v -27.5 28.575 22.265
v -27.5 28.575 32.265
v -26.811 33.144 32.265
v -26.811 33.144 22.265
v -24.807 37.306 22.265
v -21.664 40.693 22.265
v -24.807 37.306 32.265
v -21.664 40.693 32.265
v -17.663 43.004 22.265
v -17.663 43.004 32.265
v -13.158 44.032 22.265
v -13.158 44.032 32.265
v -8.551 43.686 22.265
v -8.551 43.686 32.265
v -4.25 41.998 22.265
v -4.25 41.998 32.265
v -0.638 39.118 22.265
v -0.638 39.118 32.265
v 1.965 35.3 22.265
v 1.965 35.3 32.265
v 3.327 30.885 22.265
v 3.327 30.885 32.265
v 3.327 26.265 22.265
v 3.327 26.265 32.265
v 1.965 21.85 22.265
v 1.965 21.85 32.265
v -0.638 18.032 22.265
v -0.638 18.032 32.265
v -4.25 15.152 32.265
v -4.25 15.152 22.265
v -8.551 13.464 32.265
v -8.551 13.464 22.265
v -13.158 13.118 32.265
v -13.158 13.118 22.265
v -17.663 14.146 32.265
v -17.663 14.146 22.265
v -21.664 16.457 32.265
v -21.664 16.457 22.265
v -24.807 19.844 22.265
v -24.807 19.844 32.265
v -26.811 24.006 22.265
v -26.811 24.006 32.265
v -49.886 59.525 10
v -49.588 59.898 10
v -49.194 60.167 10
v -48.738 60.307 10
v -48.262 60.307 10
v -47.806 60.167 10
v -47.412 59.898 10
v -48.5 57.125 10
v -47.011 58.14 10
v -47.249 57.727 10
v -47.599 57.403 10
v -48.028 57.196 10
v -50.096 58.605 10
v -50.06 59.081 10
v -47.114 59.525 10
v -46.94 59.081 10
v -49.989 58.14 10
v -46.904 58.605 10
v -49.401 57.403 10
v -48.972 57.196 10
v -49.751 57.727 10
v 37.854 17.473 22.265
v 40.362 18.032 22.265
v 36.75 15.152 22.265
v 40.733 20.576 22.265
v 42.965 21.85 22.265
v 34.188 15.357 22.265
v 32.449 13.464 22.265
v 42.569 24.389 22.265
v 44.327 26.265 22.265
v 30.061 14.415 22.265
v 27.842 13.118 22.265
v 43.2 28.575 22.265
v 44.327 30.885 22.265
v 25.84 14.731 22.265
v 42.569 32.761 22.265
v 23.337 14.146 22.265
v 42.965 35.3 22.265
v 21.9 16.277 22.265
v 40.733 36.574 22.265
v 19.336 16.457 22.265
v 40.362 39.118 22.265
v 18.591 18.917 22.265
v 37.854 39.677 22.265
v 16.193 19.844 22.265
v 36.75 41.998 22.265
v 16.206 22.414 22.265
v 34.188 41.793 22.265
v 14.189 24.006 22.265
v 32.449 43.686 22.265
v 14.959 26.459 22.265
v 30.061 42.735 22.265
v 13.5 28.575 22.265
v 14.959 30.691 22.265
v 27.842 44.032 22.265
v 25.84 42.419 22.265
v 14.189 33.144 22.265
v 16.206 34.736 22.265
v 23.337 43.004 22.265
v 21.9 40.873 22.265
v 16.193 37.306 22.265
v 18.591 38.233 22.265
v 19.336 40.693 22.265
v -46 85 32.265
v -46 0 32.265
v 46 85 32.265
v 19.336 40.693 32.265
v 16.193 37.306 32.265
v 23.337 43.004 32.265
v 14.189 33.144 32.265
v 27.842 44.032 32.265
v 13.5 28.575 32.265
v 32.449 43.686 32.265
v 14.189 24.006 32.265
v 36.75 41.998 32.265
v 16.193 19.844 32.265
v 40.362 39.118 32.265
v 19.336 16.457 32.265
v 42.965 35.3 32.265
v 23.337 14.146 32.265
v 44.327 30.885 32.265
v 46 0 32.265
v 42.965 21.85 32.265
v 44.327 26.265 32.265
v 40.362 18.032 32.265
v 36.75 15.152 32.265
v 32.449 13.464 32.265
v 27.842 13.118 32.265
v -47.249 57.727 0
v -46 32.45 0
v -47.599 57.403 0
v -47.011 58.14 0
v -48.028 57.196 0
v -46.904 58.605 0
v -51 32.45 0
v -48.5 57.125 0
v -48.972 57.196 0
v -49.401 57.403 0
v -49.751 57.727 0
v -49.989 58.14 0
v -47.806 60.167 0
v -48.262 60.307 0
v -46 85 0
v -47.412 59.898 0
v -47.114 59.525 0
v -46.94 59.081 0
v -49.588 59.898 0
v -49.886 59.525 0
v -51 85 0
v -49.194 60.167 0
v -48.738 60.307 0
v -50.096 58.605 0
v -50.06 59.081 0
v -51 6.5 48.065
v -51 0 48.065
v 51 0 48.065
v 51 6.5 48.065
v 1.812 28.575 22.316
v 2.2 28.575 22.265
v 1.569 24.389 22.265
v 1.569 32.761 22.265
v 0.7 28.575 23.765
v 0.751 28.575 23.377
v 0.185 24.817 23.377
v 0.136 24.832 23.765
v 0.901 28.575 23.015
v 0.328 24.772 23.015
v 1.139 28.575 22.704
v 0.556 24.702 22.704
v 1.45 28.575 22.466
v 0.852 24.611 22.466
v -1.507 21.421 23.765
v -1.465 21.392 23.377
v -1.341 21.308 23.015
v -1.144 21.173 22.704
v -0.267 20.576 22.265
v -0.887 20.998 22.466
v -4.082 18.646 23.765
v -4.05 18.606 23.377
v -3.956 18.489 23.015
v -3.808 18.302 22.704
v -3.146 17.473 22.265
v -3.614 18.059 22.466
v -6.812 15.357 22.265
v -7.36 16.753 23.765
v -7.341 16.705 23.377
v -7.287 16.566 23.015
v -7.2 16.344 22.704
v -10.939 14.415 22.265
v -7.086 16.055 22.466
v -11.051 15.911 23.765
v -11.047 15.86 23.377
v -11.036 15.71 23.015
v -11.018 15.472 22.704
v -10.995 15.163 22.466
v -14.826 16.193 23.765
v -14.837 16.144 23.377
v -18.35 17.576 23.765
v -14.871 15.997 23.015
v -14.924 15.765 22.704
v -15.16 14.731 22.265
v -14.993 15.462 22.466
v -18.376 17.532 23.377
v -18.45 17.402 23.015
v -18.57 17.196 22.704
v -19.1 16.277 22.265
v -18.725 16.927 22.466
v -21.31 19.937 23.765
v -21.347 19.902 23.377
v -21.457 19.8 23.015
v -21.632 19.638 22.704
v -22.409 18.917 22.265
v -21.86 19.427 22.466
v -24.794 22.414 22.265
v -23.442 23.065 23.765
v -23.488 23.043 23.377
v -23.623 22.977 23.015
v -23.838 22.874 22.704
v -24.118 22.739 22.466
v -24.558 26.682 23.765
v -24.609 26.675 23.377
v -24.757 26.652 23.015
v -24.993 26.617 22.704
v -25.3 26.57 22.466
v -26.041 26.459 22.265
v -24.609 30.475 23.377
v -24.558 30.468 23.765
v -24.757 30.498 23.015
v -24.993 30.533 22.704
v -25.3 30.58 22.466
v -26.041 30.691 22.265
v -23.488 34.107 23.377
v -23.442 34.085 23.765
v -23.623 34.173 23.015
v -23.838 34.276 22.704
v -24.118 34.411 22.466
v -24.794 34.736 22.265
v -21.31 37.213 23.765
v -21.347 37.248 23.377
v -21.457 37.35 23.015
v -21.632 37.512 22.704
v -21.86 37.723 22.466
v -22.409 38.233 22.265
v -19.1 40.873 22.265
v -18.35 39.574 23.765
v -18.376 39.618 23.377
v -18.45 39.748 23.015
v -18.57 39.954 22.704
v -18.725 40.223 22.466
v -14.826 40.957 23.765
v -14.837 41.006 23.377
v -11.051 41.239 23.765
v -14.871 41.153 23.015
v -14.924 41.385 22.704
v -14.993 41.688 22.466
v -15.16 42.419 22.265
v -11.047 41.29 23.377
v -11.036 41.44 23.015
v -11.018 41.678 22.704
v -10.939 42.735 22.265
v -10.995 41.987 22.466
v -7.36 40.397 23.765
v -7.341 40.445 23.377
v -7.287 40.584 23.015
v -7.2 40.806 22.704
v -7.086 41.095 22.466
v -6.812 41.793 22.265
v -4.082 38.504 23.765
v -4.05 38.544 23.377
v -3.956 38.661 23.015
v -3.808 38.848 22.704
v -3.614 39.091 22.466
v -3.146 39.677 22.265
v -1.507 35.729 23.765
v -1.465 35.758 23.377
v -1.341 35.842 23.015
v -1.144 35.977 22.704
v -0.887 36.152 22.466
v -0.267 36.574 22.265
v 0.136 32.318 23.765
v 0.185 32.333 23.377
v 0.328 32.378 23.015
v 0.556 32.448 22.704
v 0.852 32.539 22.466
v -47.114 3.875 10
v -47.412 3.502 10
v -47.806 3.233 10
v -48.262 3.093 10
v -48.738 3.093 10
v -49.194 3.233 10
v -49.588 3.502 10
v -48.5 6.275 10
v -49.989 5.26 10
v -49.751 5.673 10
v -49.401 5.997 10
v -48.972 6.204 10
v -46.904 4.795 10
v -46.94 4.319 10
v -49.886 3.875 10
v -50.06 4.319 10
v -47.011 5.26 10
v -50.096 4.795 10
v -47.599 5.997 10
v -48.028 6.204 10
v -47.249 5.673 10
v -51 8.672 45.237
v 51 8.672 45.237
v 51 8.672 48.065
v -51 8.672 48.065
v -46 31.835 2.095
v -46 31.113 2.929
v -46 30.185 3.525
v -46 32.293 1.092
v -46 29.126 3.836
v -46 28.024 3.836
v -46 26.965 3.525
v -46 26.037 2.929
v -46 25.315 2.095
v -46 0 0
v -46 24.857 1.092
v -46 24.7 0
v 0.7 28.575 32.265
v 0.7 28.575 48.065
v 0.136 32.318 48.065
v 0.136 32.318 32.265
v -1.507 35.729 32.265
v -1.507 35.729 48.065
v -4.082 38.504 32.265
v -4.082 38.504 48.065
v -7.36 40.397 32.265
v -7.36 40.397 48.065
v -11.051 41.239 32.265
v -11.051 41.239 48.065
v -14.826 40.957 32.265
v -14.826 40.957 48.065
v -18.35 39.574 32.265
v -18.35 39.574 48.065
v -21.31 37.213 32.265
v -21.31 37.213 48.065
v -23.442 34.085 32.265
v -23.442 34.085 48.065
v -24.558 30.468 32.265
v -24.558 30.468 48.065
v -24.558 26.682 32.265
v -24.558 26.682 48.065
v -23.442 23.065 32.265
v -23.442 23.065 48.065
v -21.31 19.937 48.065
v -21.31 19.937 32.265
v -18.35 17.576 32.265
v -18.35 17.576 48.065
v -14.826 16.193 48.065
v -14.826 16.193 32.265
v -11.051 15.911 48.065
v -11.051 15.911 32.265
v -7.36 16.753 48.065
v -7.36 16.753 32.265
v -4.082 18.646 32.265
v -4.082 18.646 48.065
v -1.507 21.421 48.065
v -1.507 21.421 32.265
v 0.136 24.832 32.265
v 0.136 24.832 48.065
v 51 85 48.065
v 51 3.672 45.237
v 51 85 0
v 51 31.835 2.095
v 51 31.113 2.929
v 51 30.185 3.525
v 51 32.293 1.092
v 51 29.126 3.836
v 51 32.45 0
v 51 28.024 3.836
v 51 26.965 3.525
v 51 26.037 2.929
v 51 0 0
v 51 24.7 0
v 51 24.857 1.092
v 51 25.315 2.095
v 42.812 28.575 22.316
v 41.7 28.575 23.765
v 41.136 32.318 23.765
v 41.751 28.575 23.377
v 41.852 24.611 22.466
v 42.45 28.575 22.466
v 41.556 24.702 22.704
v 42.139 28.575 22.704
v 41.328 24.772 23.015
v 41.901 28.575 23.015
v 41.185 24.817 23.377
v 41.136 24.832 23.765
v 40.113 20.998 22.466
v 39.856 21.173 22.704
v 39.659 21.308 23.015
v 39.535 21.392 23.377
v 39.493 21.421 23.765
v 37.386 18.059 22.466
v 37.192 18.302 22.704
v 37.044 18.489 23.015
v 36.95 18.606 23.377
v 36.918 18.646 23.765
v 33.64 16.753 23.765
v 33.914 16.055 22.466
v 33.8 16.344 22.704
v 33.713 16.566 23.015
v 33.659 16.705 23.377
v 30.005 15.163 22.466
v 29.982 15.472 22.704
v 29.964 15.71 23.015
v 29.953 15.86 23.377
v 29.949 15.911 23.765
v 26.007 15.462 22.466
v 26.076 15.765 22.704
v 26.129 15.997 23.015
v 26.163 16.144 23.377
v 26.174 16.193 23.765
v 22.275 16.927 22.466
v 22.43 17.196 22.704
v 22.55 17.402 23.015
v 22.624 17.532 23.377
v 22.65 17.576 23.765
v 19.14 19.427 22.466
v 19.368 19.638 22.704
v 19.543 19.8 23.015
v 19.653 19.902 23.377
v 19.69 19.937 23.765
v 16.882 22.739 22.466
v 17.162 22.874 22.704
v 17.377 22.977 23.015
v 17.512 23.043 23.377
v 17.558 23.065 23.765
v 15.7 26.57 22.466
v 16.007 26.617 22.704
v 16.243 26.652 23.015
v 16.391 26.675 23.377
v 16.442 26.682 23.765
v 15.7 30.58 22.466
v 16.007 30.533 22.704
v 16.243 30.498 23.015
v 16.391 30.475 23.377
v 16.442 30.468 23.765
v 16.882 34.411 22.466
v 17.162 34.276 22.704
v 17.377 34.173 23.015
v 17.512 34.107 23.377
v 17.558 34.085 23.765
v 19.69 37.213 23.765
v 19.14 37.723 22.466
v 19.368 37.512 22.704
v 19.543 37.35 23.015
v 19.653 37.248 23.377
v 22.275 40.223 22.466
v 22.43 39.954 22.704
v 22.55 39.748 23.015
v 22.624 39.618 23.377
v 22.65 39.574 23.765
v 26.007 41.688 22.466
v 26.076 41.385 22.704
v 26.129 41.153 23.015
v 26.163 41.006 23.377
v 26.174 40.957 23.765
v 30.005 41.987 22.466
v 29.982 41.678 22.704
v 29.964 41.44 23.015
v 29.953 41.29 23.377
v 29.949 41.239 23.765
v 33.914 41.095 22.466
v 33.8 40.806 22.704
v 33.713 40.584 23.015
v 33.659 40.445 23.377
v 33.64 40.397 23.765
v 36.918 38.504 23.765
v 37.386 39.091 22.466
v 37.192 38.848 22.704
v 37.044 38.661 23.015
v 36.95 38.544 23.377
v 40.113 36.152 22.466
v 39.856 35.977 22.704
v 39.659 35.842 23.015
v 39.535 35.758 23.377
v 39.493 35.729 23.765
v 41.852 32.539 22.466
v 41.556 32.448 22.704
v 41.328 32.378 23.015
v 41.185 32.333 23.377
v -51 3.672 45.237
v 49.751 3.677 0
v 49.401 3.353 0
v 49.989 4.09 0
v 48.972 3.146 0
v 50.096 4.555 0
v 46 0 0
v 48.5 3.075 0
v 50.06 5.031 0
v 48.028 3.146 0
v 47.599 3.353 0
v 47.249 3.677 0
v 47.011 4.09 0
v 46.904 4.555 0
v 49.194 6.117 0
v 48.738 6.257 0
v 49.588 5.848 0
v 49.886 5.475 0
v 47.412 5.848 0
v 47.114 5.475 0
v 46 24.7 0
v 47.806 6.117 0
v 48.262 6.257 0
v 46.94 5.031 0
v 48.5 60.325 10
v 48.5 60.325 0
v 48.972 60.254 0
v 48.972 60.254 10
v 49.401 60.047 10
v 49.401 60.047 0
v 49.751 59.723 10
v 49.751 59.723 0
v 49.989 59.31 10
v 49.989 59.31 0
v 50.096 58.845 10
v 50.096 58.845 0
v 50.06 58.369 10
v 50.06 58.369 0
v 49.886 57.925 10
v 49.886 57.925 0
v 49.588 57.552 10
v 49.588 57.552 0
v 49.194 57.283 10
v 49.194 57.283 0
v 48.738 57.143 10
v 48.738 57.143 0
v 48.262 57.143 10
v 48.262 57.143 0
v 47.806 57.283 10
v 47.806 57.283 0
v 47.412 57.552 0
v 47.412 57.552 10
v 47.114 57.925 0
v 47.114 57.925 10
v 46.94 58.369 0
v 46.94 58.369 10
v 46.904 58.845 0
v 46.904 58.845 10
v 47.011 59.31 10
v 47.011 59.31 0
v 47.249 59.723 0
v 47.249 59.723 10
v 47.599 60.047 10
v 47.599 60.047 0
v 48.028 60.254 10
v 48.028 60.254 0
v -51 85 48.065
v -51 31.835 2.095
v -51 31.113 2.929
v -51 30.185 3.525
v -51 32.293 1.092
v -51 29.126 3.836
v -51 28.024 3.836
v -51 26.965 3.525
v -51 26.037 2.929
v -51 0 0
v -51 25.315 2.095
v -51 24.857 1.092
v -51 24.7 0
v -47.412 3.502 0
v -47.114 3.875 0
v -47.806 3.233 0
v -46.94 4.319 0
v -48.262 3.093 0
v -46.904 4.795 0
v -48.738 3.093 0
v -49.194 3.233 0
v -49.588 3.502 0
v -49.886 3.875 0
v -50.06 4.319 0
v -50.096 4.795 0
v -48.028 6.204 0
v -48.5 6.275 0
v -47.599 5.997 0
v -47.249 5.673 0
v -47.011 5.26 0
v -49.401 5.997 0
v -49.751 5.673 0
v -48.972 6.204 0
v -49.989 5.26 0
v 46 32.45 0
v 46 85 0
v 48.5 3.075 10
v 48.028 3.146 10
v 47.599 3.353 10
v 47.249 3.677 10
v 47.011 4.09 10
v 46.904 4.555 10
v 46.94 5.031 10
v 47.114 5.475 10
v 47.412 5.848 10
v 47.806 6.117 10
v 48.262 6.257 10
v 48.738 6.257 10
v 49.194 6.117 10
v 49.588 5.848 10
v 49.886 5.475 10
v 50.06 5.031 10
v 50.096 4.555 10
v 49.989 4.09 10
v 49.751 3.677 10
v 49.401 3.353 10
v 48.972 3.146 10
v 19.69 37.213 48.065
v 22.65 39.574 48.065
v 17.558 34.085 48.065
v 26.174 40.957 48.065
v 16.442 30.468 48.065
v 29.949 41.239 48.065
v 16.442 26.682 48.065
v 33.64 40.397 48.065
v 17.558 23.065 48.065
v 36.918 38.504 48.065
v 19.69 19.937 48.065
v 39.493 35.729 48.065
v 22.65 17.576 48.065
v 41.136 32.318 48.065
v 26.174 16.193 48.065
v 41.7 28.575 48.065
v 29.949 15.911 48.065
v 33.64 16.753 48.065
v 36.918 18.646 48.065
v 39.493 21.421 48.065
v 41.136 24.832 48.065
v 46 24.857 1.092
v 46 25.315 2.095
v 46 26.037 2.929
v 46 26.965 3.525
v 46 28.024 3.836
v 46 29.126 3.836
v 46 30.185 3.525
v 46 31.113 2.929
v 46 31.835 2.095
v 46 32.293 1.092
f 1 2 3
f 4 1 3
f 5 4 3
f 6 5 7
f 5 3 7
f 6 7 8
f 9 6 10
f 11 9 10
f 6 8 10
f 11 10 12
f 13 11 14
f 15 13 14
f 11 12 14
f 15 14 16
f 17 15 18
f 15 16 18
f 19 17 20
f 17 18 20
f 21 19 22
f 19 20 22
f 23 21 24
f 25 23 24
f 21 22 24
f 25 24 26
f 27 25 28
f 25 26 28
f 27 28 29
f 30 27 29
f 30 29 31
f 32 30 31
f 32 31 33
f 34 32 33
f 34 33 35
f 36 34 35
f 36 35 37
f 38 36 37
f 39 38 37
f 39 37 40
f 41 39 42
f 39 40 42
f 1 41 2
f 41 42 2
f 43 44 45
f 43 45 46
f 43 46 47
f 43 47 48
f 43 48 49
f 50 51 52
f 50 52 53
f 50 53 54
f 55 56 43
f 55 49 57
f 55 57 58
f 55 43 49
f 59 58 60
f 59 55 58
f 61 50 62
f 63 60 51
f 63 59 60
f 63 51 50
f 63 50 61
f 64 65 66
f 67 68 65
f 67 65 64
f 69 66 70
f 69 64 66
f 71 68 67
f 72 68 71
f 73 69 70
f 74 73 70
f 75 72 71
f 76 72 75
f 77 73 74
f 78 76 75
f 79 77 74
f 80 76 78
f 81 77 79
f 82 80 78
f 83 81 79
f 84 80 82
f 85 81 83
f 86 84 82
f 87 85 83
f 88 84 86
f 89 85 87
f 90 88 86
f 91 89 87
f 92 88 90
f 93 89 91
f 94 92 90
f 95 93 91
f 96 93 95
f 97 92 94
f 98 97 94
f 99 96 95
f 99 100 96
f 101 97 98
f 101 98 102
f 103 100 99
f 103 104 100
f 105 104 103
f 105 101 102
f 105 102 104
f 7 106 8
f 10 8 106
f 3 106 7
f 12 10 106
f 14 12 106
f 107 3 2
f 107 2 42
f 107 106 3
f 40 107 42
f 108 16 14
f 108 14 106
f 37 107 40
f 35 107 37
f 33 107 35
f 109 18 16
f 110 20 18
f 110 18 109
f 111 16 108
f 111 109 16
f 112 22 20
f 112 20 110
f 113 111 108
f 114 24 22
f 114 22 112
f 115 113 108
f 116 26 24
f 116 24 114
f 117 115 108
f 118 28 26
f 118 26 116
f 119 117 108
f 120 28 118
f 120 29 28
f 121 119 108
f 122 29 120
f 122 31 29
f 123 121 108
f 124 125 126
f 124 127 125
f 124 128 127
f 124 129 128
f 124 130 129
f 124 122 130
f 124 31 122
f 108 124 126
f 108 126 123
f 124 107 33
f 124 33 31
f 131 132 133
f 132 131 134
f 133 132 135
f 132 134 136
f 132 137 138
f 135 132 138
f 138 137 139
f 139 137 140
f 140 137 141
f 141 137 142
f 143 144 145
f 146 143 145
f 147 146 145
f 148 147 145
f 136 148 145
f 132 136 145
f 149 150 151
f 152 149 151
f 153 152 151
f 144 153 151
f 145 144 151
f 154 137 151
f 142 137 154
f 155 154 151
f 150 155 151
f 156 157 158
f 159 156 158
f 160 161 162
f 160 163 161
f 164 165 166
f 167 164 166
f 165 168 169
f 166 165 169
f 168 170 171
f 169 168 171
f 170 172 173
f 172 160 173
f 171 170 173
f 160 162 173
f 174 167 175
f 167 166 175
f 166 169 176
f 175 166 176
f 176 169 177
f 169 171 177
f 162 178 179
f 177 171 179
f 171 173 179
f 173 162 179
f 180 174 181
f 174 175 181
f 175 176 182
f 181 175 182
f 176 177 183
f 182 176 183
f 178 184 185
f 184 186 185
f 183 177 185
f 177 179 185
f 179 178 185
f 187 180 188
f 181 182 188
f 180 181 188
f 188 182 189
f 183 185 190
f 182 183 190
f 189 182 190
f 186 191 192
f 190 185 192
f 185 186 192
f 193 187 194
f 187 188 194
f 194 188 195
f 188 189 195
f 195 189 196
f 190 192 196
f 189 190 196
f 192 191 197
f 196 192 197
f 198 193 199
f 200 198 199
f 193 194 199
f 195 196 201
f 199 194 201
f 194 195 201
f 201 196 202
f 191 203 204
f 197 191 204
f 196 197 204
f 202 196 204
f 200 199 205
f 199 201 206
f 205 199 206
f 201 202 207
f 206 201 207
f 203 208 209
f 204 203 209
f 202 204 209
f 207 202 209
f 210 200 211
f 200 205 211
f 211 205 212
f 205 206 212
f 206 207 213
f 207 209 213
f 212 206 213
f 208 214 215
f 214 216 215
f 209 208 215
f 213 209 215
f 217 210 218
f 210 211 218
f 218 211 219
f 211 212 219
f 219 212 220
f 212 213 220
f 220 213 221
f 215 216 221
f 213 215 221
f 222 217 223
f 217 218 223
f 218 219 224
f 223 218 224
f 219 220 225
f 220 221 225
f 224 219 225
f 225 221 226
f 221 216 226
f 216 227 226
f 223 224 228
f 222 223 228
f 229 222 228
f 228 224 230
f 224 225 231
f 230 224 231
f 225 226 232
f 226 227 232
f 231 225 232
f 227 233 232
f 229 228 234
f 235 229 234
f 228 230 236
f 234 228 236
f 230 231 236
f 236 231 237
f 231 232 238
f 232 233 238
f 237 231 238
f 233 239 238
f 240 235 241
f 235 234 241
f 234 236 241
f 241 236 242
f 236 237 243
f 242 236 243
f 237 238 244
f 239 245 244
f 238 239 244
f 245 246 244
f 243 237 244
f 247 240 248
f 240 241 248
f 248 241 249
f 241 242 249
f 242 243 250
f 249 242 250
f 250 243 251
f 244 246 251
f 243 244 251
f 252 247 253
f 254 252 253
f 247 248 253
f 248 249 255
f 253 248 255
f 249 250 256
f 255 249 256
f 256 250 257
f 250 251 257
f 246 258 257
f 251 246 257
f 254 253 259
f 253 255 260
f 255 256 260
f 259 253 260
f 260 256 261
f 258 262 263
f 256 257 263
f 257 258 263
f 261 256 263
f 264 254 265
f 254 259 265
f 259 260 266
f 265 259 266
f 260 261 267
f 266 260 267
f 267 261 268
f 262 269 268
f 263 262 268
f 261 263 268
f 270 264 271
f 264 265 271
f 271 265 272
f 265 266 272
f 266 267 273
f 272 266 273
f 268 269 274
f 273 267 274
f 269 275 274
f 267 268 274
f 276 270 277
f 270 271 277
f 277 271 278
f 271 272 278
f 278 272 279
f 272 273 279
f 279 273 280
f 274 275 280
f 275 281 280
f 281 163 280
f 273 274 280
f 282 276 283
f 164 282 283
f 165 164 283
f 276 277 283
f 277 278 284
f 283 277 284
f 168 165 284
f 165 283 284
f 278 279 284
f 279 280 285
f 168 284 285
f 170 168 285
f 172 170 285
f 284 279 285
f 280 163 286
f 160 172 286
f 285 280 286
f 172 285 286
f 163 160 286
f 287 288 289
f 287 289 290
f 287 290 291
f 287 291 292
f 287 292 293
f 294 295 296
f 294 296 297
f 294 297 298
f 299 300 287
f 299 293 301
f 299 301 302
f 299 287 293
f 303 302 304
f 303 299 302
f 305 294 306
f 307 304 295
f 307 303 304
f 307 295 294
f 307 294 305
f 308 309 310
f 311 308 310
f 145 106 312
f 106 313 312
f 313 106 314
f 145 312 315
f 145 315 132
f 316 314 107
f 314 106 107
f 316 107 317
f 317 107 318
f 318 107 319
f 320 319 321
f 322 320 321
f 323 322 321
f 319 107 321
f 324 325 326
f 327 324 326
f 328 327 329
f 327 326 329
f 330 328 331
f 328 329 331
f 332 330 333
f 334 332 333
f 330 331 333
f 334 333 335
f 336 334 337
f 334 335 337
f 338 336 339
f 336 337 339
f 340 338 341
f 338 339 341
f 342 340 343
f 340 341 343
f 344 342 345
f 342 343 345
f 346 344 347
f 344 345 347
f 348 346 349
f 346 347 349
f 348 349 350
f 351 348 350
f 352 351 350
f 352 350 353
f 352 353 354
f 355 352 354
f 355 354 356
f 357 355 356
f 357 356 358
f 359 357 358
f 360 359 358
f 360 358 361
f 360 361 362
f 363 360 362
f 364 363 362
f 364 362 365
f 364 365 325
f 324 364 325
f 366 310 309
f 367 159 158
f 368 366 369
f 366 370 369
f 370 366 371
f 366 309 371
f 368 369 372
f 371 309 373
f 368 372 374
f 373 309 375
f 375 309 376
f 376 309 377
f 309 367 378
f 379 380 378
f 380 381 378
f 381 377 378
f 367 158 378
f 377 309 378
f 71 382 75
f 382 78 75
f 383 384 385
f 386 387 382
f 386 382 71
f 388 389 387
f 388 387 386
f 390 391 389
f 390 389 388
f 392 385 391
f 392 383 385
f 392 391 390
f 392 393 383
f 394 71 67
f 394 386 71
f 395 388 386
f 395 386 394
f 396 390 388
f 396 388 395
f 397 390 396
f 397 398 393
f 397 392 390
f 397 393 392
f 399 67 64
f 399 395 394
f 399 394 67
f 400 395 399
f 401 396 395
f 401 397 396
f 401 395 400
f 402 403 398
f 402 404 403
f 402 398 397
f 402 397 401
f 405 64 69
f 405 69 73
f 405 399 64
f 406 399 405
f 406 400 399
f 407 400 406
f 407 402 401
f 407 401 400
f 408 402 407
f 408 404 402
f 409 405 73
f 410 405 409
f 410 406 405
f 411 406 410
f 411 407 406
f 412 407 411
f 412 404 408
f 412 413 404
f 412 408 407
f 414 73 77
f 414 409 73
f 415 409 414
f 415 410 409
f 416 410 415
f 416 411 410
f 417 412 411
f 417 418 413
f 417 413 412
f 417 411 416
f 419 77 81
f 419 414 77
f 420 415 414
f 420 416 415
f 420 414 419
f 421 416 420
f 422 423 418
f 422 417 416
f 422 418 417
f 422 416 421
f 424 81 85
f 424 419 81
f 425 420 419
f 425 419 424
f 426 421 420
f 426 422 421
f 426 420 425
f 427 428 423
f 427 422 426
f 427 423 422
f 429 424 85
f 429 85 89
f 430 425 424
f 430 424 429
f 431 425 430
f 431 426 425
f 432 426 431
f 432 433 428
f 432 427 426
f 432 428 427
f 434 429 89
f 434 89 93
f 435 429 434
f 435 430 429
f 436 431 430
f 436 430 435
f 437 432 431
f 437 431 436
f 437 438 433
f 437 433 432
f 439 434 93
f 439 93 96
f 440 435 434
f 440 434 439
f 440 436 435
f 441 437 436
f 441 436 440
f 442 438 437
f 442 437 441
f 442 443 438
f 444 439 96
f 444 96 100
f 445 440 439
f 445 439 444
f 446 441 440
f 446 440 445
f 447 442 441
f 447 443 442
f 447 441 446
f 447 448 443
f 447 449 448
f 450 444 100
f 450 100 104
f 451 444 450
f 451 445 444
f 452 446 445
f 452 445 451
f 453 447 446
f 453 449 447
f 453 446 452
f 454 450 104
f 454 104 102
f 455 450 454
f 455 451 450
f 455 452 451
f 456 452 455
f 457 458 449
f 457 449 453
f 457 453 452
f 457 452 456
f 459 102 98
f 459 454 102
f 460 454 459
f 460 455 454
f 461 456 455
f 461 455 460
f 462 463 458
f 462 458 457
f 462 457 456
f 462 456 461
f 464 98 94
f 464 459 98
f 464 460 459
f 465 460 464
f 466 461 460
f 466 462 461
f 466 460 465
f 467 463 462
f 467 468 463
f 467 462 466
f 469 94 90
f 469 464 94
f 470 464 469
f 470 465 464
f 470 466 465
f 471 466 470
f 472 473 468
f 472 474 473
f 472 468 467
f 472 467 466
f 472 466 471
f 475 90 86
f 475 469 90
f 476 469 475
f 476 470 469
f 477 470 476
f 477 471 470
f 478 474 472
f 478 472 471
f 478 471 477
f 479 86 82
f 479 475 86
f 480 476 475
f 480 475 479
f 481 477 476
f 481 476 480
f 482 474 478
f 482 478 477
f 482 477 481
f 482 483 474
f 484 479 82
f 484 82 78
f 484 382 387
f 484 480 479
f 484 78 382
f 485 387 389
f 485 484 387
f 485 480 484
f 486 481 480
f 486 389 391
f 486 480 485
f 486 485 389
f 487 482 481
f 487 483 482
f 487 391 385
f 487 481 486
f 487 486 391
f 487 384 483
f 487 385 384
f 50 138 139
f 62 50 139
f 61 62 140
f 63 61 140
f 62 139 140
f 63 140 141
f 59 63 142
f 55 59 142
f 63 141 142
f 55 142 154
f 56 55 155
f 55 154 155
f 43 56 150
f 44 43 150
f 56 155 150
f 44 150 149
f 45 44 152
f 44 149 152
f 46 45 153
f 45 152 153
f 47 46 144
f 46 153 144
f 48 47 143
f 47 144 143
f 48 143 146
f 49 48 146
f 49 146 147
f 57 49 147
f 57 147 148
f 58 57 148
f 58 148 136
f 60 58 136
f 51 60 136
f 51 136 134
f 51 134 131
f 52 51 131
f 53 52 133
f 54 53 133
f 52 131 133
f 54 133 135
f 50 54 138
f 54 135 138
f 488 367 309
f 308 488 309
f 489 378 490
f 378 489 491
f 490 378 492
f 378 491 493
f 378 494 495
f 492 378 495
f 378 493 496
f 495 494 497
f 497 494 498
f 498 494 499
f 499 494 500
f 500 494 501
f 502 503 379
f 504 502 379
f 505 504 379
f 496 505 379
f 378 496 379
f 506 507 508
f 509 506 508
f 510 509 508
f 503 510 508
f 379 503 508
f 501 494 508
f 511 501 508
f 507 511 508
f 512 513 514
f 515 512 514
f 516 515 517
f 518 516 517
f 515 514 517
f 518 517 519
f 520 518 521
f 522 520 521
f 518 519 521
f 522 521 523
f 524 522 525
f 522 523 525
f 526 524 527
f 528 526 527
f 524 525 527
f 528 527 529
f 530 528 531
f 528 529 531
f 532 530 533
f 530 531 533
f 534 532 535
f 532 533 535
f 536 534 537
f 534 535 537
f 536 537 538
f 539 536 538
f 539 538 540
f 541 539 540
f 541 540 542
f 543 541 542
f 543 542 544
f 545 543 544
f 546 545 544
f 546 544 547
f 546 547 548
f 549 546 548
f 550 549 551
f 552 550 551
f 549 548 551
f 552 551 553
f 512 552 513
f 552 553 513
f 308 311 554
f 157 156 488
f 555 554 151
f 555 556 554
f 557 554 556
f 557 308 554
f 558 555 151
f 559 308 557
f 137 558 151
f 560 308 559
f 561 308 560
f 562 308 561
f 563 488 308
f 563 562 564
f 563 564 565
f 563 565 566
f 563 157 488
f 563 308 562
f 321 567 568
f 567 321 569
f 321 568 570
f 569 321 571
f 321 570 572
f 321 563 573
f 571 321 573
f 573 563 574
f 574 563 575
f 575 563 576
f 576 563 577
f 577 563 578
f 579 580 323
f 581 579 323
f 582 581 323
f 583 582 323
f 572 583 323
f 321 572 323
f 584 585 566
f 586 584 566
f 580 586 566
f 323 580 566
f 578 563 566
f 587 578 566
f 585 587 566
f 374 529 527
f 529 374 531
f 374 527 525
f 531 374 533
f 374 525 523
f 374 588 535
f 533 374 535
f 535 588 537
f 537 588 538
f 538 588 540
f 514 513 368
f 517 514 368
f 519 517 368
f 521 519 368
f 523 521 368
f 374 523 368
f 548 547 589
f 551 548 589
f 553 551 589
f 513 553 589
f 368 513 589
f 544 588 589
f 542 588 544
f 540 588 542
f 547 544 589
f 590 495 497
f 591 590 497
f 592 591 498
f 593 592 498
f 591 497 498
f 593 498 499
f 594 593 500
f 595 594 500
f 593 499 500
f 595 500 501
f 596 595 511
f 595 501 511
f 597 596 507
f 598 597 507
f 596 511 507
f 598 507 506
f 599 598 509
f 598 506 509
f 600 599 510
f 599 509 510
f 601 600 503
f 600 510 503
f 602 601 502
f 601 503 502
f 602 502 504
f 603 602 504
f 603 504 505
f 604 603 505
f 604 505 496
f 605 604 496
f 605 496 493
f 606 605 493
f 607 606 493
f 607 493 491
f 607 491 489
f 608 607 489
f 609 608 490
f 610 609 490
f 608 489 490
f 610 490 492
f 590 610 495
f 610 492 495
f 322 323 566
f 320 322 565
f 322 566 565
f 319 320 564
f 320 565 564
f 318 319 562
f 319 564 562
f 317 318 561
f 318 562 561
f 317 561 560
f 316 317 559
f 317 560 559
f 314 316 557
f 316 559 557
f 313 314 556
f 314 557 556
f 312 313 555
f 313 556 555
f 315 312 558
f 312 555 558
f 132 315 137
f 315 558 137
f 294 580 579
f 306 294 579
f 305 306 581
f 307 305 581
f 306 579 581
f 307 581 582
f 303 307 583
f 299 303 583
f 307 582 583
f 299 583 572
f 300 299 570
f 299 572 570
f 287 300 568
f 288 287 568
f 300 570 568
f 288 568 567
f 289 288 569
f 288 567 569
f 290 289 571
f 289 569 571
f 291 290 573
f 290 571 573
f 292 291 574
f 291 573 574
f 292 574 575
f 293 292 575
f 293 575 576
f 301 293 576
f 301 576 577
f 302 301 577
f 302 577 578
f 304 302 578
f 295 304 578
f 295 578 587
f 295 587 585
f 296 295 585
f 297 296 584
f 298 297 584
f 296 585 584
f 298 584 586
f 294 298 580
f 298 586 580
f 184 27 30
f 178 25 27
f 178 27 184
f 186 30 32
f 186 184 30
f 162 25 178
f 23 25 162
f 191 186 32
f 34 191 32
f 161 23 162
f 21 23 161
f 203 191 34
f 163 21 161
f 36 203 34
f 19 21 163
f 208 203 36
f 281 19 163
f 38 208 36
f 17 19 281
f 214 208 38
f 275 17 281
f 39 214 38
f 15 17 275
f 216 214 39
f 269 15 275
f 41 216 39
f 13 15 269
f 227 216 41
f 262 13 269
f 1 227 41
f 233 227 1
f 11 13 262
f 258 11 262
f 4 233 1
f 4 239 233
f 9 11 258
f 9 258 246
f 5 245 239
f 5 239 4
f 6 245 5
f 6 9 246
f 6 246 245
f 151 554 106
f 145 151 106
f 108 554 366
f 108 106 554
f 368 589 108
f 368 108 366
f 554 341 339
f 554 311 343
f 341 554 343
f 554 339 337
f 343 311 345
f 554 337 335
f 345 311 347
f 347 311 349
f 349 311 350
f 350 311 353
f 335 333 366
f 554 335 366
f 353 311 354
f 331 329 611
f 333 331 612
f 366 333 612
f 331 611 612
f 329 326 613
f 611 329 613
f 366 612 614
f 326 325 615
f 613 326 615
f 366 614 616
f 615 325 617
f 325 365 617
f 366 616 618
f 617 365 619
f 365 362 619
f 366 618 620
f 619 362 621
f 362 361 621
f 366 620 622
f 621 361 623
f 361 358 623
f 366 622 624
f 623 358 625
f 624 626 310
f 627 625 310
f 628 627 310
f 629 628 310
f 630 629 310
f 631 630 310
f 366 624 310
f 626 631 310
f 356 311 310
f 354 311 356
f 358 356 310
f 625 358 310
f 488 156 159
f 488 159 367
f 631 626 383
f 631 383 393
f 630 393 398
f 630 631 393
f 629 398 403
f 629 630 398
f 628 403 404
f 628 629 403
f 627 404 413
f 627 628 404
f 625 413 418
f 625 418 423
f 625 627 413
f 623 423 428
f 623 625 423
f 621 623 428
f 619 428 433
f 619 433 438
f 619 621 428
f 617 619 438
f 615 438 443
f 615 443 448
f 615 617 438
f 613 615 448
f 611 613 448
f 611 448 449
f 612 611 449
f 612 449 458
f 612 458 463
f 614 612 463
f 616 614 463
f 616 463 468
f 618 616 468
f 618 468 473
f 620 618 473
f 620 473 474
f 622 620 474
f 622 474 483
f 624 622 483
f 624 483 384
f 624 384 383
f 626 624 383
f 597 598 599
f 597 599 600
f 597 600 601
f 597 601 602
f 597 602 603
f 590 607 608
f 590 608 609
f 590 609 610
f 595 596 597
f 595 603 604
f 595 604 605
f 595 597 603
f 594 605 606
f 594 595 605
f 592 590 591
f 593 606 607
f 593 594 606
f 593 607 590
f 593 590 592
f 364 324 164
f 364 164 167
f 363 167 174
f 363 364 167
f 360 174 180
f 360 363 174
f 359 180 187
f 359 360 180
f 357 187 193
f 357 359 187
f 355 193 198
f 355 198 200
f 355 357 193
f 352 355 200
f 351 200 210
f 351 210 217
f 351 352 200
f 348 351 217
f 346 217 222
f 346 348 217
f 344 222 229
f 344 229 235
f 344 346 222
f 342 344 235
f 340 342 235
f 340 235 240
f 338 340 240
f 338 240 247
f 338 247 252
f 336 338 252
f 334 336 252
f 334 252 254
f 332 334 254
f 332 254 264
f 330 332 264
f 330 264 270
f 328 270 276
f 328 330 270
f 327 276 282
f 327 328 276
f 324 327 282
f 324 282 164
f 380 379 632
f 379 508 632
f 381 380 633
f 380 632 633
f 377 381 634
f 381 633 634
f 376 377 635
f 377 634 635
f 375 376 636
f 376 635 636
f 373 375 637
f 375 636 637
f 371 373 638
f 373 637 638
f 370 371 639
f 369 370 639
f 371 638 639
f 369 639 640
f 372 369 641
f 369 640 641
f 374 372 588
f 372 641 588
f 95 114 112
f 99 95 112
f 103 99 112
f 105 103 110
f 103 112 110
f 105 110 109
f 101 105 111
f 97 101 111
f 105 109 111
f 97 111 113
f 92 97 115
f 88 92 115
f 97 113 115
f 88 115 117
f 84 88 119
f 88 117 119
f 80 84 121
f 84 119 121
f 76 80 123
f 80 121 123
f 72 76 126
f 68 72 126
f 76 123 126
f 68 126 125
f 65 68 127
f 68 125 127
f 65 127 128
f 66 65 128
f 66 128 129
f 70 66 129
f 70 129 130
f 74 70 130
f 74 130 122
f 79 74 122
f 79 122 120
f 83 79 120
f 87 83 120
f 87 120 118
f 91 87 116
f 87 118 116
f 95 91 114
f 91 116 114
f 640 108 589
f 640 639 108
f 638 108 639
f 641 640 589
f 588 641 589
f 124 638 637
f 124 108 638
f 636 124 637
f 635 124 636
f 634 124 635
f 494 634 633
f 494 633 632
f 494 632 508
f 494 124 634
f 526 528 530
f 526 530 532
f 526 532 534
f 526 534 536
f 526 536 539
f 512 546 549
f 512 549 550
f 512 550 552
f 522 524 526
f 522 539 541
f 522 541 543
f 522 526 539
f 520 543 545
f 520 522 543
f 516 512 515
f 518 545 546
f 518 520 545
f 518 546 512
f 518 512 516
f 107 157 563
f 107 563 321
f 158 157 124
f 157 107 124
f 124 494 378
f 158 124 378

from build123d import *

# Parameters (mm, degrees)
SKETCH2_W           = 102
SKETCH2_H           = 96.13
SKETCH2_W_2         = 92
SKETCH2_H_2         = 64.53
BOSS_EXTRUDE1_DEPTH = 85
SKETCH8_R           = 12.7
CUT_EXTRUDE7_DEPTH  = 20
SKETCH9_R           = 10
CUT_EXTRUDE8_DEPTH  = 20
SKETCH10_R          = 3.875
CUT_EXTRUDE9_DEPTH  = 142.206388754
SKETCH11_W          = 48.065
SKETCH11_H          = 85
CUT_EXTRUDE11_DEPTH = 142.206388754
SKETCH12_R          = 1.6
CUT_EXTRUDE12_DEPTH = 10
SKETCH14_R          = 15.5
SKETCH14_R_2        = 12.7
BOSS_EXTRUDE2_DEPTH = 10
FILLET1_R           = 1.5
CUT_EXTRUDE13_DEPTH = 142.206388754


with BuildPart() as part:
    # Sketch2 → Boss-Extrude1 (new body)
    with BuildSketch(Plane(origin=(0, 0, 0), x_dir=(1, 0, 0), z_dir=(0, 1, 0))):
        Rectangle(SKETCH2_W, SKETCH2_H)
        Rectangle(SKETCH2_W_2, SKETCH2_H_2, mode=Mode.SUBTRACT)
    extrude(amount=BOSS_EXTRUDE1_DEPTH)

    # Sketch8 → Cut-Extrude7 (cut)
    with BuildSketch(Plane.XY.offset(48.065)):
        with Locations((-12, 28.575)):
            Circle(SKETCH8_R)
        with Locations((29, 28.575)):
            Circle(SKETCH8_R)
    extrude(amount=-CUT_EXTRUDE7_DEPTH, mode=Mode.SUBTRACT)

    # Sketch9 → Cut-Extrude8 (cut)
    with BuildSketch(Plane(origin=(0, 0, -48.065), x_dir=(-1, 0, 0), z_dir=(0, 0, -1))):
        with Locations((-31, 31.7)):
            Circle(SKETCH9_R)
        with Locations((29, 31.7)):
            Circle(SKETCH9_R)
    extrude(amount=-CUT_EXTRUDE8_DEPTH, mode=Mode.SUBTRACT)

    # Sketch10 → Cut-Extrude9 (cut, through all)
    with BuildSketch(Plane.ZY.offset(51)):
        with Locations((0, 28.575)):
            Circle(SKETCH10_R)
    extrude(amount=-CUT_EXTRUDE9_DEPTH, mode=Mode.SUBTRACT)

    # Sketch11 → Cut-Extrude11 (cut, through all)
    with BuildSketch(Plane.ZY.offset(51)):
        with Locations((-24.0325, 42.5)):
            Rectangle(SKETCH11_W, SKETCH11_H)
    extrude(amount=-CUT_EXTRUDE11_DEPTH, mode=Mode.SUBTRACT)

    # Sketch12 → Cut-Extrude12 (cut)
    with BuildSketch(Plane(origin=(0, 0, 0), x_dir=(-1, 0, 0), z_dir=(0, 0, -1))):
        with Locations(Location((-48.5, 58.725, 0), (0, 0, 90))):
            Circle(SKETCH12_R)
        with Locations(Location((-48.5, 4.675, 0), (0, 0, 270))):
            Circle(SKETCH12_R)
        with Locations(Location((48.5, 4.675, 0), (0, 0, 90))):
            Circle(SKETCH12_R)
        with Locations(Location((48.5, 58.725, 0), (0, 0, 270))):
            Circle(SKETCH12_R)
    extrude(amount=-CUT_EXTRUDE12_DEPTH, mode=Mode.SUBTRACT)

    # Sketch14 → Boss-Extrude2 (add)
    # profile 1 of 2: a face of its own
    with BuildSketch(Plane(origin=(0, 0, 32.265), x_dir=(-1, 0, 0), z_dir=(0, 0, -1))):
        with Locations((-29, 28.575)):
            Circle(SKETCH14_R)
        with Locations(Location((-29, 28.575, 0), (0, 0, 180))):
            Circle(SKETCH14_R_2, mode=Mode.SUBTRACT)
    # profile 2 of 2: a face of its own
    with BuildSketch(Plane(origin=(0, 0, 32.265), x_dir=(-1, 0, 0), z_dir=(0, 0, -1))):
        with Locations((12, 28.575)):
            Circle(SKETCH14_R)
        with Locations(Location((12, 28.575, 0), (0, 0, 180))):
            Circle(SKETCH14_R_2, mode=Mode.SUBTRACT)
    extrude(amount=BOSS_EXTRUDE2_DEPTH)

    # Fillet1
    fillet1_edges = [part.edges().sort_by_distance(p)[0] for p in [
        (16.3, 28.575, 22.265),
        (-24.7, 28.575, 22.265),
    ]]
    fillet(fillet1_edges, radius=FILLET1_R)

    # Sketch15 → Cut-Extrude13 (cut, through all)
    with BuildSketch(Plane(origin=(51, 0, 0), x_dir=(0, 0, -1), z_dir=(1, 0, 0))):
        Polygon((-48.065, 6.5), (-45.236572875, 3.671572875), (-45.236572875, 8.671572875), (-48.065, 8.671572875), align=None)
    extrude(amount=-CUT_EXTRUDE13_DEPTH, mode=Mode.SUBTRACT)


solid = part.part
